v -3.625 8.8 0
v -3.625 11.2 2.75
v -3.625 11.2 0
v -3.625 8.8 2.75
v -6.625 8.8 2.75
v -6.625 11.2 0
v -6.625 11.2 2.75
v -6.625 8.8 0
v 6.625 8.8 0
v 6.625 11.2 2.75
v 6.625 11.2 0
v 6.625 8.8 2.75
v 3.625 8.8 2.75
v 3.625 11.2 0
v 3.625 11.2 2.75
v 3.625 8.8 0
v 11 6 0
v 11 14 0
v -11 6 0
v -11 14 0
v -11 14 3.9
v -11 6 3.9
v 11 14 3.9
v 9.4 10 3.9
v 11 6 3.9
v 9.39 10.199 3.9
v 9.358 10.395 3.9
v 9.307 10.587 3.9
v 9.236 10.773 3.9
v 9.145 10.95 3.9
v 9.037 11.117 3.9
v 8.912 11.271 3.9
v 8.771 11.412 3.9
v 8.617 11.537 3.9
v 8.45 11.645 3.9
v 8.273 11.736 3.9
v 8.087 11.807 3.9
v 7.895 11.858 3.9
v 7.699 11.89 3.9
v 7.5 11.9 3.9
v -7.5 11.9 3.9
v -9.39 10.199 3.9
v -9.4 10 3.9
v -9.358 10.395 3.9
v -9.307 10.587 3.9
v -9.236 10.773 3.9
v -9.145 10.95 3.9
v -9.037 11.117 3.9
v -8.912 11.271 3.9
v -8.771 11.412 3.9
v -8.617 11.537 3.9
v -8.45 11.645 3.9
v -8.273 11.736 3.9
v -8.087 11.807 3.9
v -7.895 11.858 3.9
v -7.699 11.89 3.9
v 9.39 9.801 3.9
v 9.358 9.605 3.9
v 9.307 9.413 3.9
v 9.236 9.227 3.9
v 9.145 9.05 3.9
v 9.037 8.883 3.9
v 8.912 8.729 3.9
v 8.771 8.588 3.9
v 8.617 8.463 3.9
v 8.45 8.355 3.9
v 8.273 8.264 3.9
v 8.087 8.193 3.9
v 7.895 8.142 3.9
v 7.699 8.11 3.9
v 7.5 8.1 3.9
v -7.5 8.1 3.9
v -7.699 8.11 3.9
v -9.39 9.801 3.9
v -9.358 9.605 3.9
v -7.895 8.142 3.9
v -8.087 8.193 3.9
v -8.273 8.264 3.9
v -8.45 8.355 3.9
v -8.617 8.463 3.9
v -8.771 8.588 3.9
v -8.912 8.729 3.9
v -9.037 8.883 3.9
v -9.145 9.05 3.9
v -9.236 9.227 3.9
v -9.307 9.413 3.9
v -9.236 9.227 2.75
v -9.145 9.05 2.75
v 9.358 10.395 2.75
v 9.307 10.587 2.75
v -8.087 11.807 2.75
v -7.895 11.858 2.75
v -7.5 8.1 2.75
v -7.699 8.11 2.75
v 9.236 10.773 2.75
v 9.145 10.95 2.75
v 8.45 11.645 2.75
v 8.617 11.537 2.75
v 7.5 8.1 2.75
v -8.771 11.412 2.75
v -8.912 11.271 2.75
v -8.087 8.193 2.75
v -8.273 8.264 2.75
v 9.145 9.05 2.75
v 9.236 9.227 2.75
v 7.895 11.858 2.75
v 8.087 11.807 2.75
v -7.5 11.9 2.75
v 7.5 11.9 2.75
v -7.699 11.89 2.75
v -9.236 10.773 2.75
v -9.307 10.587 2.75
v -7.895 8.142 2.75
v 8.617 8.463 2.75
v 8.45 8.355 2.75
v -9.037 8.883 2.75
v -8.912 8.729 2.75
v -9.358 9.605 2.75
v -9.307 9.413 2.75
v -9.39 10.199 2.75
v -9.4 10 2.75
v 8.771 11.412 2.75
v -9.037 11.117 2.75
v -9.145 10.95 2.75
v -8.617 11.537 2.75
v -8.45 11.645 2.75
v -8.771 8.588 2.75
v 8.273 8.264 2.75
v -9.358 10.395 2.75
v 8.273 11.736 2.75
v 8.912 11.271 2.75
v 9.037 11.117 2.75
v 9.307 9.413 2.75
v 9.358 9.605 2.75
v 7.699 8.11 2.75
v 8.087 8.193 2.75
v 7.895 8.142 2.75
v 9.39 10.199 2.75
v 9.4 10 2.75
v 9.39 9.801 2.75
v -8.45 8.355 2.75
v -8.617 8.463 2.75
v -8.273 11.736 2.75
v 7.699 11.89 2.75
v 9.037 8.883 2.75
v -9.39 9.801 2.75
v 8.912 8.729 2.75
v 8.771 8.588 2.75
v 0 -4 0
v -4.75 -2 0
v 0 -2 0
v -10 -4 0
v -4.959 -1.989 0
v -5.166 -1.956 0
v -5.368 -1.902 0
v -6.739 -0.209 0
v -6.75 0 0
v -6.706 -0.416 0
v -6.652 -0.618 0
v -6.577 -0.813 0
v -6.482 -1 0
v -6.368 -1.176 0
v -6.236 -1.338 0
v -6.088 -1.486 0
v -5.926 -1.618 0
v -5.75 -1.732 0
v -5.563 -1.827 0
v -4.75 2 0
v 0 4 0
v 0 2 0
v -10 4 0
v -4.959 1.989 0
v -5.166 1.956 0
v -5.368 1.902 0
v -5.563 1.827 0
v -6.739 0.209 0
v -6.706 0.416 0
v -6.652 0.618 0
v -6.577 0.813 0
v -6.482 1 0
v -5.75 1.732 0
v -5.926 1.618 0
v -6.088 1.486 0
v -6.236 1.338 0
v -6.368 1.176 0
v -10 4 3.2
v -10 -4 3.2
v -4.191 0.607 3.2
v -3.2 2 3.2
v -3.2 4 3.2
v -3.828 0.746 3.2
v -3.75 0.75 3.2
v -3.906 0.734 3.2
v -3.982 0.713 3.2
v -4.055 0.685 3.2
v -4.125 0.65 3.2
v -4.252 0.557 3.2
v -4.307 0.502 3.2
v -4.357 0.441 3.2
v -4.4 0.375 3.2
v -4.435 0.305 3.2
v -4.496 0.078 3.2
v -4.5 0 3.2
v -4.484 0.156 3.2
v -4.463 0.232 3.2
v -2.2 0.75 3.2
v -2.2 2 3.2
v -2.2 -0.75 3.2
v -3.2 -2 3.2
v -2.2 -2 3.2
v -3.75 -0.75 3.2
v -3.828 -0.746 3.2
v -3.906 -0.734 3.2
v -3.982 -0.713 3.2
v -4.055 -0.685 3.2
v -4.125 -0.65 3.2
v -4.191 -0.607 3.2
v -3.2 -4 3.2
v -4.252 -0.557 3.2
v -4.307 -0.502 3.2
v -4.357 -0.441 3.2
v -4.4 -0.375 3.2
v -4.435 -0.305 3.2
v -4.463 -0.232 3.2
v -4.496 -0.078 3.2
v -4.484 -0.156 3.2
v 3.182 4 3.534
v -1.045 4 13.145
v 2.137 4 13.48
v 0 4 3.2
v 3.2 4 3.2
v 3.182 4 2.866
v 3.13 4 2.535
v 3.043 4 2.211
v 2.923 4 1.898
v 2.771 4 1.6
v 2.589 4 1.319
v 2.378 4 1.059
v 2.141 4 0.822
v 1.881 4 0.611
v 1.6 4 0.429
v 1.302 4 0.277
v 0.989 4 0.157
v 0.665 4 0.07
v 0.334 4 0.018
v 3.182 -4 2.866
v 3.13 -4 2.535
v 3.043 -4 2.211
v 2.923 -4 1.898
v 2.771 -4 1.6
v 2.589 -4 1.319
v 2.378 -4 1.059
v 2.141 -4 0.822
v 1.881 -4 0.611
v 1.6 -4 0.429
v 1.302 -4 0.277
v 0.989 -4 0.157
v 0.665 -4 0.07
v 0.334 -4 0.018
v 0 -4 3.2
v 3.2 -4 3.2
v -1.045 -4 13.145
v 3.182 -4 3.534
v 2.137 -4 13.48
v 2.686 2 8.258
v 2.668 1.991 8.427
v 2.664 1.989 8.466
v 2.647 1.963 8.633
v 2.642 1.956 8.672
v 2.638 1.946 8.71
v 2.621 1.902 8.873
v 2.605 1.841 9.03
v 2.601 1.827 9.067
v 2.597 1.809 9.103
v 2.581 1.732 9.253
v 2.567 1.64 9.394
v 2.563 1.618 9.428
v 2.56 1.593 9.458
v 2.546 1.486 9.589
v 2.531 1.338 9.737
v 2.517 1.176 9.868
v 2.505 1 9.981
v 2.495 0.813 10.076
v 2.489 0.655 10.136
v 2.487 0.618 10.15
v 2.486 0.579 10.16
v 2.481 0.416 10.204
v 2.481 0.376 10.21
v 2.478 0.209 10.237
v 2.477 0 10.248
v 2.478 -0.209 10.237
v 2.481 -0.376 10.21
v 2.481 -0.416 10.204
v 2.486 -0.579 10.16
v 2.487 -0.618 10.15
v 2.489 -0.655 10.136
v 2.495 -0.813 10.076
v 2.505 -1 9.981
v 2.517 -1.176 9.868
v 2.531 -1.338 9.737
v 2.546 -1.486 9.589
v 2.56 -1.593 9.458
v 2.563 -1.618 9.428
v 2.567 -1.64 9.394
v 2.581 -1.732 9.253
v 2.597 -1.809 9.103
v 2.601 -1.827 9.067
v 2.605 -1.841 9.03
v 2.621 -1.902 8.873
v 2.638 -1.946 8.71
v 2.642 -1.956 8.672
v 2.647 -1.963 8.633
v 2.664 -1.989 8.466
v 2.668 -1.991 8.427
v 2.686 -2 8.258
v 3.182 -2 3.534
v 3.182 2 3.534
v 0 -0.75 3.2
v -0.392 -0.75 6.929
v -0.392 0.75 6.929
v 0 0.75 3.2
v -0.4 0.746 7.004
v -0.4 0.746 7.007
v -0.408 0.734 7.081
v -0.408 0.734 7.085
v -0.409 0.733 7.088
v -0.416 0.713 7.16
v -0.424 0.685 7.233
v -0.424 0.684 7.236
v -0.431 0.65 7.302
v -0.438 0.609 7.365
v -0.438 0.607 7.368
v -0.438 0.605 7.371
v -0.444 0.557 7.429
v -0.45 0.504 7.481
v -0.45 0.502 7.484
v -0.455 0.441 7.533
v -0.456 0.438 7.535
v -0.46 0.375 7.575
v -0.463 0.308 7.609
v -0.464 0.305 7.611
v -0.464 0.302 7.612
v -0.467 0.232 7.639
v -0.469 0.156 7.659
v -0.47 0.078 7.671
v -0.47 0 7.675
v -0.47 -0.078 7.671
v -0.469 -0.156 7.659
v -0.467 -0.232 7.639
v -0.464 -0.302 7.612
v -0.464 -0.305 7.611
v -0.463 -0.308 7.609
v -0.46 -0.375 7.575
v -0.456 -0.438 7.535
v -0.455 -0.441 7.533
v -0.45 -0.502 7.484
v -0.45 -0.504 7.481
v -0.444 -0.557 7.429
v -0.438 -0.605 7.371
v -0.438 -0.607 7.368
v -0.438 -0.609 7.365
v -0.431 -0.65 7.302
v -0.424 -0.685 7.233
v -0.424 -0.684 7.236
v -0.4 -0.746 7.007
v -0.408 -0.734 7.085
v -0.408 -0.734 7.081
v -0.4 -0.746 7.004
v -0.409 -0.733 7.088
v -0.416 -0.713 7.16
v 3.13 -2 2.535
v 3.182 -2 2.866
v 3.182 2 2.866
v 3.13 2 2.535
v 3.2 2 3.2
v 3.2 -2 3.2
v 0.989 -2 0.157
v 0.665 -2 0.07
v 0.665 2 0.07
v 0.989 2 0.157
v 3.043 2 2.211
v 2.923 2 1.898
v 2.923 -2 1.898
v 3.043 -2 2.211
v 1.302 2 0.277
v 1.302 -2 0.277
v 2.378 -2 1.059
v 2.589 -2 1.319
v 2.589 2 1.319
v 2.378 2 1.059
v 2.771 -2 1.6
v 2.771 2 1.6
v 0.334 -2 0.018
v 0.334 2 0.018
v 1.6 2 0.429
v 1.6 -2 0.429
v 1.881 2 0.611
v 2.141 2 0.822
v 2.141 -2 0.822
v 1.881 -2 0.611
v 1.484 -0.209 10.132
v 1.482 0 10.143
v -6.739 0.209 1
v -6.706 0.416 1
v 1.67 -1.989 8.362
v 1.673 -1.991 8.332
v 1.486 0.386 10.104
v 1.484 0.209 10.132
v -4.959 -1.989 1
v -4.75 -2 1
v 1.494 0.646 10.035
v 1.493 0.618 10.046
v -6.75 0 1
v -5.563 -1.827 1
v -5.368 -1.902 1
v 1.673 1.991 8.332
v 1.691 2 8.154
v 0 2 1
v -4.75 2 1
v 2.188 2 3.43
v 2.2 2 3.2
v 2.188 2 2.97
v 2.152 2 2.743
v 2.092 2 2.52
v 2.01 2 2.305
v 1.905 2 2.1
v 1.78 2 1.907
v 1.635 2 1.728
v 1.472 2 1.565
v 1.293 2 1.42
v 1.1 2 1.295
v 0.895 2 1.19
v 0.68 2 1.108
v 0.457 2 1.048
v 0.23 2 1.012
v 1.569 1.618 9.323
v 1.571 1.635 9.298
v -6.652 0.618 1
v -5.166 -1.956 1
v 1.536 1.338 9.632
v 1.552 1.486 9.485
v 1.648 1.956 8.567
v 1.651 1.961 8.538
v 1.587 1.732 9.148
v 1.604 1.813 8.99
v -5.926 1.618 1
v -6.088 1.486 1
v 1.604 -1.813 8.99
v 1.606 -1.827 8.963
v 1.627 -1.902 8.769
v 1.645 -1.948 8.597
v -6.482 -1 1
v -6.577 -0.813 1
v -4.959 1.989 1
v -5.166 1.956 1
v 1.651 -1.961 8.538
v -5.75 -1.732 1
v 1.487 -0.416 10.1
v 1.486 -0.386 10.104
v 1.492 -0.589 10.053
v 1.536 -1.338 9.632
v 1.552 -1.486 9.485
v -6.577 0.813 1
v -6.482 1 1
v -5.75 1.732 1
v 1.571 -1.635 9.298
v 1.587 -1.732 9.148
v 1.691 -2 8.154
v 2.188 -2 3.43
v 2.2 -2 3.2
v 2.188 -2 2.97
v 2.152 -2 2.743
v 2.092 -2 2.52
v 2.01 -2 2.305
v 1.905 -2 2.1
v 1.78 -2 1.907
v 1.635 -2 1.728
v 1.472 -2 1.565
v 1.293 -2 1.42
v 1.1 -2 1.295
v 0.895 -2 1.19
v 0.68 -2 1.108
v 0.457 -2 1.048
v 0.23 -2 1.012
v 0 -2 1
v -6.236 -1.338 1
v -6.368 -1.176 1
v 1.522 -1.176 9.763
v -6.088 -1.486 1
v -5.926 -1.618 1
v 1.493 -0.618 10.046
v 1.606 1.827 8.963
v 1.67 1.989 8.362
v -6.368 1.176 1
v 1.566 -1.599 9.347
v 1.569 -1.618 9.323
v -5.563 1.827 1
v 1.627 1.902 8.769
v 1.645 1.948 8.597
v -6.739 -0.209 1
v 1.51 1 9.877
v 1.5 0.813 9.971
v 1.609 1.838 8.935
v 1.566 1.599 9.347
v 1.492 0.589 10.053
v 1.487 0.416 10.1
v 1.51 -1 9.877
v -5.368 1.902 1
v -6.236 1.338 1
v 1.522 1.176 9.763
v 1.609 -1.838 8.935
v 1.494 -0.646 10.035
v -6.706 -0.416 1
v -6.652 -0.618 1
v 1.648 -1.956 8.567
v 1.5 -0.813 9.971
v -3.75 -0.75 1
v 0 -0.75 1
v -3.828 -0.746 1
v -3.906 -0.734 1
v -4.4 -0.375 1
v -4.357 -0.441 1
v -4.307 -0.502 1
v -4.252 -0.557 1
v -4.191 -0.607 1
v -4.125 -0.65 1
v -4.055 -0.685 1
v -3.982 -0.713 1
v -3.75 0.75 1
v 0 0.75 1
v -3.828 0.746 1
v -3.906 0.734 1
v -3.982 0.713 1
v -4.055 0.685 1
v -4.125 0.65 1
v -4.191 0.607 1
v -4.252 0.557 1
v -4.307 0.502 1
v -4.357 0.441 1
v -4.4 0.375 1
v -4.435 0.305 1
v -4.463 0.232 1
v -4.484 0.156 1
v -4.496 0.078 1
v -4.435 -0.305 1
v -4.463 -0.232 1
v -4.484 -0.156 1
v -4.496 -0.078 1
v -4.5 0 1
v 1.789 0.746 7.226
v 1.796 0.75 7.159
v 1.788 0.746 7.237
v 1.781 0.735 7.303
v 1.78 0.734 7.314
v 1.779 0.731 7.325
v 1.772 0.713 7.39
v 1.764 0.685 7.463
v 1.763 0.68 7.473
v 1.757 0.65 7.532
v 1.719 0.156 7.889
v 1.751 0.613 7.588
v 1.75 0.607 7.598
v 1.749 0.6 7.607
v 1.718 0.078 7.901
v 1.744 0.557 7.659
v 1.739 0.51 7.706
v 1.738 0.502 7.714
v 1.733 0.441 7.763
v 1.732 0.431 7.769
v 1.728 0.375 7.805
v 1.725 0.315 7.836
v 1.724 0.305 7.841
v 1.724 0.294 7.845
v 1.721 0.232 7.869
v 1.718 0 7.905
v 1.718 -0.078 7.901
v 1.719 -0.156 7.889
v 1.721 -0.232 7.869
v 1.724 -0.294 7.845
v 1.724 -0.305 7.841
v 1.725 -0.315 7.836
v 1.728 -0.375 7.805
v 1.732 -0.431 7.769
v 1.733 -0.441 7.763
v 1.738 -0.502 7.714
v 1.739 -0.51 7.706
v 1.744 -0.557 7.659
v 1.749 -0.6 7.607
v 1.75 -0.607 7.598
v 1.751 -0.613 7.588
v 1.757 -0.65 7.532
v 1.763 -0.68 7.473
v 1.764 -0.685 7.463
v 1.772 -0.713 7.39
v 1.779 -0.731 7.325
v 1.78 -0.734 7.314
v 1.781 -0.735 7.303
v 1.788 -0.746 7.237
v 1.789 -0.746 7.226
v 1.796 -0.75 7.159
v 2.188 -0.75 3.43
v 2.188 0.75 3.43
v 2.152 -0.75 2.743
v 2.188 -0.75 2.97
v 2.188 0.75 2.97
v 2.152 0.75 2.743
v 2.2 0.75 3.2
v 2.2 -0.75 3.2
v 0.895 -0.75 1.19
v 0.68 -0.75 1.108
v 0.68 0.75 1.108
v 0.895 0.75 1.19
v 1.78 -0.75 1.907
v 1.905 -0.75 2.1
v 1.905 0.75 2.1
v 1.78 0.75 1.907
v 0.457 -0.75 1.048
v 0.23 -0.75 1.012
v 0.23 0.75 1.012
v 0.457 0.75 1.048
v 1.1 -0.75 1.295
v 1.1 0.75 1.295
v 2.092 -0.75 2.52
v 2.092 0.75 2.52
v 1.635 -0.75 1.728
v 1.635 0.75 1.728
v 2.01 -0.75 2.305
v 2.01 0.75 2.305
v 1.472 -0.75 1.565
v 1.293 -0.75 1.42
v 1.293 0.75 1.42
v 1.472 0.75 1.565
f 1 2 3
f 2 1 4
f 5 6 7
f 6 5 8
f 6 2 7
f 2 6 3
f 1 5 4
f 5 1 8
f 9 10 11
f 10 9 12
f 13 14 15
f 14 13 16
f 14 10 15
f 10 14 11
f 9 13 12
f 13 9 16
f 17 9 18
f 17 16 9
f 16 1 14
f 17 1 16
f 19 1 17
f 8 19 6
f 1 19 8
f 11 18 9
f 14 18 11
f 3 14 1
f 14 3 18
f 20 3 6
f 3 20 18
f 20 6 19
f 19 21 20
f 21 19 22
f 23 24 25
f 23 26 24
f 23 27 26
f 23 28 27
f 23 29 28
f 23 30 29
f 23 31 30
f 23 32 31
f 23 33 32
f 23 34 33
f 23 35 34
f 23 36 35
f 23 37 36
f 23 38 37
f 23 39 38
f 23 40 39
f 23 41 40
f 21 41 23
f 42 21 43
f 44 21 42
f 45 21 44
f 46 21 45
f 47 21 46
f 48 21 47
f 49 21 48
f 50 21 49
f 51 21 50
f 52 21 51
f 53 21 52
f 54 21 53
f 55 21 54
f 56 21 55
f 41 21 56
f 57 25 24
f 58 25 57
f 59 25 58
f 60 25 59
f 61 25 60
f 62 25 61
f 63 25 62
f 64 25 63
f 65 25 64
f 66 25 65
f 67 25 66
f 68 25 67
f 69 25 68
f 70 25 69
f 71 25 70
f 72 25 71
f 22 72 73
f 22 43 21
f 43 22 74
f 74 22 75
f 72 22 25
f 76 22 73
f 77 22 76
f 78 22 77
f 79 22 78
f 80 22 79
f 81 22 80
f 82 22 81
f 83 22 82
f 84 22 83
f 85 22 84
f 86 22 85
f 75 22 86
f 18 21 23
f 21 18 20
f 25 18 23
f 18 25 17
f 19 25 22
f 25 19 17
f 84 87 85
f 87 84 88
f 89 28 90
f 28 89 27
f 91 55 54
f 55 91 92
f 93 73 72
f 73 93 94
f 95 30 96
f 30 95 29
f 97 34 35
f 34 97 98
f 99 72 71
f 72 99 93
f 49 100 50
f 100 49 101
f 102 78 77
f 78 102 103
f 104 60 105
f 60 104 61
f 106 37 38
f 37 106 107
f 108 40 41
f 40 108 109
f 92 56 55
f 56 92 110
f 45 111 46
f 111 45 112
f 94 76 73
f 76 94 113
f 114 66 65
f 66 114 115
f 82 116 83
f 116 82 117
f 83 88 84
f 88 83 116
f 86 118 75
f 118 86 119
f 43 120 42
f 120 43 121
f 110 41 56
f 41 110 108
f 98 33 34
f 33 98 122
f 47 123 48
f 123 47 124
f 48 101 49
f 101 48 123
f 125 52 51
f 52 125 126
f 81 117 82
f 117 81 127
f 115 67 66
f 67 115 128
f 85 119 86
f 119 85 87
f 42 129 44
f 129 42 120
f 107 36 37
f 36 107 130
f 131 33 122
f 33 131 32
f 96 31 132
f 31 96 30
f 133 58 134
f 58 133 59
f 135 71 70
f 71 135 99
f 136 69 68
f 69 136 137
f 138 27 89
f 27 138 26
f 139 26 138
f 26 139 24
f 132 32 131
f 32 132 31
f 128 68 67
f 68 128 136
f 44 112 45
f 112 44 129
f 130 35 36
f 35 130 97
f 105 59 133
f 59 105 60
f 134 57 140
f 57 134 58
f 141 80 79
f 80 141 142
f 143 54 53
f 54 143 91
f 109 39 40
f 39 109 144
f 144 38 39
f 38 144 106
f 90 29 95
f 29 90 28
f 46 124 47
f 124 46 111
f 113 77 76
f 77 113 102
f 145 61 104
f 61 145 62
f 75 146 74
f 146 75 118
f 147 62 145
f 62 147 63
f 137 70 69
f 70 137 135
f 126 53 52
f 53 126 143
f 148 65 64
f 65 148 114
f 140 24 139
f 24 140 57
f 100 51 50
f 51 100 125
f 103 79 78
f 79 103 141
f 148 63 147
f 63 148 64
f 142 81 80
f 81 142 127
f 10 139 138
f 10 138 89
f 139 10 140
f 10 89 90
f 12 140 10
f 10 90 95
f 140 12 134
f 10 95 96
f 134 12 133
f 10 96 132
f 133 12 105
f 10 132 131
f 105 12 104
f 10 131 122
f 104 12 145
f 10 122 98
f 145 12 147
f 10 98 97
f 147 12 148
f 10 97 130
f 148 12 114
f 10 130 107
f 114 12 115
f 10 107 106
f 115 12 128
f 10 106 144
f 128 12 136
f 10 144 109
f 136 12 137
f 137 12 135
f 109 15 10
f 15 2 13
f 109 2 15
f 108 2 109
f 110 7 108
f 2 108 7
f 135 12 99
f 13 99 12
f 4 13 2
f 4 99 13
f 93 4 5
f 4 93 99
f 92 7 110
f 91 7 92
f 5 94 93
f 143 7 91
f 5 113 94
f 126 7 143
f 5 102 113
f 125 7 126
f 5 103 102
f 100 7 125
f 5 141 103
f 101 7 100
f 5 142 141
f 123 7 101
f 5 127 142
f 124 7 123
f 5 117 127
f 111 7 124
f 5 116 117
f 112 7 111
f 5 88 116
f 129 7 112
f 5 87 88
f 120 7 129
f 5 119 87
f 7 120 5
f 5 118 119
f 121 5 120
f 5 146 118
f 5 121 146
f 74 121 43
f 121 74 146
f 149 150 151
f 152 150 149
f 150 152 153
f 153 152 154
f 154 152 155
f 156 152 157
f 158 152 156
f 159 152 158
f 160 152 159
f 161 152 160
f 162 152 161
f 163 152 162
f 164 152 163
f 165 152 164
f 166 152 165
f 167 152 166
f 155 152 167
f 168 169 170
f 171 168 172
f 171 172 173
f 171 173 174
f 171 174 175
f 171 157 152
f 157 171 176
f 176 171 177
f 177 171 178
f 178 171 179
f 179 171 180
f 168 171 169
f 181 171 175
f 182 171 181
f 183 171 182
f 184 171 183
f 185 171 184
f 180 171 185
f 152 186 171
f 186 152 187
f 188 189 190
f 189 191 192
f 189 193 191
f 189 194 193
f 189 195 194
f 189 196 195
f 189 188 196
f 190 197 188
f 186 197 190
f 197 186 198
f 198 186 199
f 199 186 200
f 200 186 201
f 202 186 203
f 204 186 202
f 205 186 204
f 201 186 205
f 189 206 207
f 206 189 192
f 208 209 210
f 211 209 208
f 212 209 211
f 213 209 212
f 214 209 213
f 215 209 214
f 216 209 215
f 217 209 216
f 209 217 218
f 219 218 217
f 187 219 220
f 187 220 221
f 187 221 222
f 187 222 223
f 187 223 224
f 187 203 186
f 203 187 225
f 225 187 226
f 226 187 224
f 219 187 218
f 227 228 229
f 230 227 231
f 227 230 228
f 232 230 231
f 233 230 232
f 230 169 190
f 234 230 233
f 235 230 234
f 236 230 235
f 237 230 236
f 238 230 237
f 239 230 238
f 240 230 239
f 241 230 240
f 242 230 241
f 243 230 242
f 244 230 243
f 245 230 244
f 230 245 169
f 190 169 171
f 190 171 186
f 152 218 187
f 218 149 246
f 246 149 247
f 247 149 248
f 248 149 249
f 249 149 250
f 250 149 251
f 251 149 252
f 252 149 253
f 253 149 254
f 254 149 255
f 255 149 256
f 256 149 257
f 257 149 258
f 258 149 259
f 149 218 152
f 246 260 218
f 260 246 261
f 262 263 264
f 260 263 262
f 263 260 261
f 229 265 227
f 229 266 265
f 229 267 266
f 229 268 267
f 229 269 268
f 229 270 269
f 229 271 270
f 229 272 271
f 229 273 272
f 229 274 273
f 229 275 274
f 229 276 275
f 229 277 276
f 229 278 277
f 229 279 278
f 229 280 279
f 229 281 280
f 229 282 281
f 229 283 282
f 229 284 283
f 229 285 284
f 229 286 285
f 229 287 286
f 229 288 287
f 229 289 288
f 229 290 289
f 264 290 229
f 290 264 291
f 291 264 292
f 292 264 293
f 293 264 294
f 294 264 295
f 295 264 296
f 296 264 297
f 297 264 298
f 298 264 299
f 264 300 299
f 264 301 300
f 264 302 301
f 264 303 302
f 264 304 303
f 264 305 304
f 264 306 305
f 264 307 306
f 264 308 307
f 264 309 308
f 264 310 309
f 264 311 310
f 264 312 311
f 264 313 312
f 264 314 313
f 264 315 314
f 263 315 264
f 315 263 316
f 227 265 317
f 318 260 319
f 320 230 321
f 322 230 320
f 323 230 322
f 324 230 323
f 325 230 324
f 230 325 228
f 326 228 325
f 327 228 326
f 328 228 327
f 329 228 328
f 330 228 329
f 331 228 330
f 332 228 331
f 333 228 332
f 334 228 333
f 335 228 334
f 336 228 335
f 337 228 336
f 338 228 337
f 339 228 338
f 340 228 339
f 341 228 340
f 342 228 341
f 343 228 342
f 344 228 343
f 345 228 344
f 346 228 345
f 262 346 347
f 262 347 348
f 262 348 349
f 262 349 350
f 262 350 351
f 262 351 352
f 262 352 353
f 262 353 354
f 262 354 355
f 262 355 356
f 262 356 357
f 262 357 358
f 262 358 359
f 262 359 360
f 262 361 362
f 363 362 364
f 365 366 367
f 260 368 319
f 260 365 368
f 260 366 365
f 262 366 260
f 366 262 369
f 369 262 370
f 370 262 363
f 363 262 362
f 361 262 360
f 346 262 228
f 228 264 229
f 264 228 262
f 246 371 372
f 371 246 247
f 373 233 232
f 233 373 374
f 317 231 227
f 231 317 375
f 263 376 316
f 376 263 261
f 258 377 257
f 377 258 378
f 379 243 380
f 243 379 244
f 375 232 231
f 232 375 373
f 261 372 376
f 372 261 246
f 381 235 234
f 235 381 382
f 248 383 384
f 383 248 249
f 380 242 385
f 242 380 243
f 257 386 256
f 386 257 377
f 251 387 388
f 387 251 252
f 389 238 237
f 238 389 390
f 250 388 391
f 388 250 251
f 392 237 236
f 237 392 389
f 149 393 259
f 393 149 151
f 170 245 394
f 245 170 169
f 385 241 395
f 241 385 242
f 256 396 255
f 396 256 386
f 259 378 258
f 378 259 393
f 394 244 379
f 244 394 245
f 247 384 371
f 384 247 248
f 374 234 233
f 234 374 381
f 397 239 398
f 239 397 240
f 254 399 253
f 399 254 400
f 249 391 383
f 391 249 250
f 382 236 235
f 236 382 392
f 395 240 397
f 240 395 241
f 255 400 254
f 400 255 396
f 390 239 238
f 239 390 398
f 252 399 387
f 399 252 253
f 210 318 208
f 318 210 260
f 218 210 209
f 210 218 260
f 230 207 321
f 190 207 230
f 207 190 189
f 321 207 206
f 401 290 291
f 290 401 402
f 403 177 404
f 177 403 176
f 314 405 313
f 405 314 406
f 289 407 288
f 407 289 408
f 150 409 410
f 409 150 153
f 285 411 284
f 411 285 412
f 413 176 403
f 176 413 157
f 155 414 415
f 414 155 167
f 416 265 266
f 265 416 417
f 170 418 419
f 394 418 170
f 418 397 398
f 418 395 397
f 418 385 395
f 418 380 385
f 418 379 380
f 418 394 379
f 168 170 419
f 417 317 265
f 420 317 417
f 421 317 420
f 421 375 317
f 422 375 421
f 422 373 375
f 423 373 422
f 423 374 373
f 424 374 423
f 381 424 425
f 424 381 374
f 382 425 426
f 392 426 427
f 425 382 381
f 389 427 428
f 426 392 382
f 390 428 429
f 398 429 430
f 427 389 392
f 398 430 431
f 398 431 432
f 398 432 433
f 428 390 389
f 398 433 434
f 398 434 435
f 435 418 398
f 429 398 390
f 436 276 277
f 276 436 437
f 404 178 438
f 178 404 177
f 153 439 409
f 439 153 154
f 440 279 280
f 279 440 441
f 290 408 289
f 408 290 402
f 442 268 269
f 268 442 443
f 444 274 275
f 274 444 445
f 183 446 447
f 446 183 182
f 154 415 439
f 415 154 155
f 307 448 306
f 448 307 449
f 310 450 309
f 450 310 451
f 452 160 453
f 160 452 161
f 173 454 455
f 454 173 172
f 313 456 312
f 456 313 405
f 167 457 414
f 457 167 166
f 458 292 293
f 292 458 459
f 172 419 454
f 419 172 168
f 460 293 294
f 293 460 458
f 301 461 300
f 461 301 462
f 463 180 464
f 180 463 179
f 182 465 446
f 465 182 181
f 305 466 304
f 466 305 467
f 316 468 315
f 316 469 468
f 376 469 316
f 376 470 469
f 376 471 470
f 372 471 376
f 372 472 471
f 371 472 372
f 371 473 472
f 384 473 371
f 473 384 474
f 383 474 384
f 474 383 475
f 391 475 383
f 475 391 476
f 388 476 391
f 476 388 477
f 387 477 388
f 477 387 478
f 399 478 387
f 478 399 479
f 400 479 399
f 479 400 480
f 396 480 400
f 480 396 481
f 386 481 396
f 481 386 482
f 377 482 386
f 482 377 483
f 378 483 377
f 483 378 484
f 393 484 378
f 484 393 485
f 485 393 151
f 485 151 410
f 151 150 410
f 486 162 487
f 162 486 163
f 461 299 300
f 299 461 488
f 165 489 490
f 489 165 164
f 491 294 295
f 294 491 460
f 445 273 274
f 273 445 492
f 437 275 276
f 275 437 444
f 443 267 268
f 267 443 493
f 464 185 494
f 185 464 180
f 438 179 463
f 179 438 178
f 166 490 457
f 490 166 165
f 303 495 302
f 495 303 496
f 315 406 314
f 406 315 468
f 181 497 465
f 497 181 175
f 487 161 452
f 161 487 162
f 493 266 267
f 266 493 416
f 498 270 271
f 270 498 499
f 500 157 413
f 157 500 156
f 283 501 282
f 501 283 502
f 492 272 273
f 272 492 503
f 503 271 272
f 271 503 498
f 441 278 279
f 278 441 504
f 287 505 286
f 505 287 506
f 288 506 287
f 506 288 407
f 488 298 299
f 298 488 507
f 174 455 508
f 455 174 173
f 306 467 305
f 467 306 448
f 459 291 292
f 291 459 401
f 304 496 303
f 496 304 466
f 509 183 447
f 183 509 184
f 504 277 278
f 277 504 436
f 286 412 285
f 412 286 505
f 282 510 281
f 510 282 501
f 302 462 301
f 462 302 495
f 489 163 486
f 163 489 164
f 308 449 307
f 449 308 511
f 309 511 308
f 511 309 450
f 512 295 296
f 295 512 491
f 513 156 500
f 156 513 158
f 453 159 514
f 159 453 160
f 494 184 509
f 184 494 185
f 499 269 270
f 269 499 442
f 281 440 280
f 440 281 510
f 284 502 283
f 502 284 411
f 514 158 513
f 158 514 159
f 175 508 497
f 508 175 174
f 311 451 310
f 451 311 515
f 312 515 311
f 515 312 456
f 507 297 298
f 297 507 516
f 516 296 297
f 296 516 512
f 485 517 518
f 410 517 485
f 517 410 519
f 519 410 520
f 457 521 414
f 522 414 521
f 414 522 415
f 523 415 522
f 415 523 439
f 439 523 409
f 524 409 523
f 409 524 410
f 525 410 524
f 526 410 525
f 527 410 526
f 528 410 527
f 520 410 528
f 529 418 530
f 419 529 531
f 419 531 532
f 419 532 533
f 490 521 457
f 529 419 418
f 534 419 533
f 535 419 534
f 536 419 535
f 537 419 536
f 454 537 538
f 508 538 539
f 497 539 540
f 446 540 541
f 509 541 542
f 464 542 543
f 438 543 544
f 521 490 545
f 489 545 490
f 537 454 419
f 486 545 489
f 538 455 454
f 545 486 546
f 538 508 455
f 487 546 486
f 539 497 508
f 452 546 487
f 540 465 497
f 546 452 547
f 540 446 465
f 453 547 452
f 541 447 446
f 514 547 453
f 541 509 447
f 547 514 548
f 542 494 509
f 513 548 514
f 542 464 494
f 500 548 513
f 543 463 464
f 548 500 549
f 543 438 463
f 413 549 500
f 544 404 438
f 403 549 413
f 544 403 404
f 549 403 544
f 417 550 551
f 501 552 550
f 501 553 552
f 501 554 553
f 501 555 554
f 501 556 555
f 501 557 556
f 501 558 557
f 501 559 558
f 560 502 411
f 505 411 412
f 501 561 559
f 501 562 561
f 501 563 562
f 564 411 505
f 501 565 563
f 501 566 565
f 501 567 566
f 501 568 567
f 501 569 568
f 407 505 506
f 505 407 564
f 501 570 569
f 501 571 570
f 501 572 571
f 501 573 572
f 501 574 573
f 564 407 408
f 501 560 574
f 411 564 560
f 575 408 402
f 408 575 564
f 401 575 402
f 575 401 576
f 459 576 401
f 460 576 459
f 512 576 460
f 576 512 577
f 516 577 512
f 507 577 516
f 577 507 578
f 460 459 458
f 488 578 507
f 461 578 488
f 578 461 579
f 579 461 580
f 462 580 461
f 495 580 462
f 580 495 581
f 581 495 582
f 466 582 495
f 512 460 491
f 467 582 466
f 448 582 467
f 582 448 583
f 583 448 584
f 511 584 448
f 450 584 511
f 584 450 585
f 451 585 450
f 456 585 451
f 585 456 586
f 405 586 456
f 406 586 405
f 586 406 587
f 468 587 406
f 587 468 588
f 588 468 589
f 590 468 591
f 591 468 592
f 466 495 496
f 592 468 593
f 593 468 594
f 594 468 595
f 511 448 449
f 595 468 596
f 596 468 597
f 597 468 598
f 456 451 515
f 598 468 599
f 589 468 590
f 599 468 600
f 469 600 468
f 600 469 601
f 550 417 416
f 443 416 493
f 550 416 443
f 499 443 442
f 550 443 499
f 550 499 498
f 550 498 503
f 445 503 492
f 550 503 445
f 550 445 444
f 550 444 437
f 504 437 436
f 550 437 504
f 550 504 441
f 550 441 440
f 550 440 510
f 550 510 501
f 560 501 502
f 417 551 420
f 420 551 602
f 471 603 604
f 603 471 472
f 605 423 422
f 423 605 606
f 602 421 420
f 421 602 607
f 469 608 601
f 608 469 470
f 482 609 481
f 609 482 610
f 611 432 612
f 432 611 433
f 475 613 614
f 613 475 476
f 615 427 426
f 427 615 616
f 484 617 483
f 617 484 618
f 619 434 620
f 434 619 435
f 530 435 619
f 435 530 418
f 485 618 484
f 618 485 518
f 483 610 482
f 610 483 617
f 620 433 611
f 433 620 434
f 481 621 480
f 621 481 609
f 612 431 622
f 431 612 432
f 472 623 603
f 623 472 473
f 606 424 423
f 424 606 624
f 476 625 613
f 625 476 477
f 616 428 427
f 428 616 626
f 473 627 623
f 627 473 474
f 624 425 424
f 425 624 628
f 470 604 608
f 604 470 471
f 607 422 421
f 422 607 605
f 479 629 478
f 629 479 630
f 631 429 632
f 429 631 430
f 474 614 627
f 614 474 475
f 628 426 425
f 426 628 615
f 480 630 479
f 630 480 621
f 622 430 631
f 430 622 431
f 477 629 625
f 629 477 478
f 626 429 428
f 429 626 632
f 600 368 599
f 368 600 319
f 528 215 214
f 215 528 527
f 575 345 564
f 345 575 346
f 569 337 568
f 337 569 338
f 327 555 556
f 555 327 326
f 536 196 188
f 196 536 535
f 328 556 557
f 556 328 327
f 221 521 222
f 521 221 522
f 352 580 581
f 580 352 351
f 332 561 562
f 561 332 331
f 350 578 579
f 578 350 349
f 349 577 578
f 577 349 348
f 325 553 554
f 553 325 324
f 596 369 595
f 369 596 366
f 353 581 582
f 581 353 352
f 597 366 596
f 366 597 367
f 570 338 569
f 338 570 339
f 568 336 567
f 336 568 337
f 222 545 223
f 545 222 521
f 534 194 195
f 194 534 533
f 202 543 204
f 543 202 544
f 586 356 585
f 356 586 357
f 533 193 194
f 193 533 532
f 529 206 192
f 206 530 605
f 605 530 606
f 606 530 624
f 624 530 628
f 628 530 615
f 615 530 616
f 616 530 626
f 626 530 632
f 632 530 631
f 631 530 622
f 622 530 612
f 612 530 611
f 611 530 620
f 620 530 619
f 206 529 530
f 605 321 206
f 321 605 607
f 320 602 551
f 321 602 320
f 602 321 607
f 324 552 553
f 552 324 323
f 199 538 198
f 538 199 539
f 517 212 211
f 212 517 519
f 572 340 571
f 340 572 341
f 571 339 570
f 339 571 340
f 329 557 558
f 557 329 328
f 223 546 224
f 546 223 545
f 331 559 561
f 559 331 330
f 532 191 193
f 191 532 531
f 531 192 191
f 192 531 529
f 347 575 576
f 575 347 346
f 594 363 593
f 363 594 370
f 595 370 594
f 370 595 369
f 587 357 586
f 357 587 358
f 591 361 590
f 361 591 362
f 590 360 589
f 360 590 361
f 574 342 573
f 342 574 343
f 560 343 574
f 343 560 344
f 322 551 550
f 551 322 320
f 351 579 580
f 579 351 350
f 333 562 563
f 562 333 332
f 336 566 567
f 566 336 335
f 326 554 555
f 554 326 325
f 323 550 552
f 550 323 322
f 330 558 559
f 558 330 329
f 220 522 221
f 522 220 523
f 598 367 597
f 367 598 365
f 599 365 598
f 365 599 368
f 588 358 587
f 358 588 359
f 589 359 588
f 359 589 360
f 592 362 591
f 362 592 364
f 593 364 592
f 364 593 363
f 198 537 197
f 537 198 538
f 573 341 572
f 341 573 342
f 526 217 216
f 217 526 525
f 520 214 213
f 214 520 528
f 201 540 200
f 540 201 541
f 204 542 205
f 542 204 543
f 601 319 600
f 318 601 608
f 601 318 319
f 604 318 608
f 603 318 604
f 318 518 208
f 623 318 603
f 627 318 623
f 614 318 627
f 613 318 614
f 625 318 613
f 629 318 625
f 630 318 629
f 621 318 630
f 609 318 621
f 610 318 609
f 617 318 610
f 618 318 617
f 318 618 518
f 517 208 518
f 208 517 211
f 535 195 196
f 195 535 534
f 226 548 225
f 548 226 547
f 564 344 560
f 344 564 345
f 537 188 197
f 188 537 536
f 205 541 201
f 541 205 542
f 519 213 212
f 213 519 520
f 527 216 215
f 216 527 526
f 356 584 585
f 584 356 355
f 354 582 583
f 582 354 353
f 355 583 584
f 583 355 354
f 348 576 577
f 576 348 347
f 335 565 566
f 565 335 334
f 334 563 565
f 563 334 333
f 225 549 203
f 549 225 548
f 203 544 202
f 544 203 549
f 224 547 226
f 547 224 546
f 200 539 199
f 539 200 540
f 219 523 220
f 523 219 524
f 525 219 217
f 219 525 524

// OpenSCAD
// Test jig for Rubber feet for the Macintosh Portable
// Copyright François Revol, 2026

$fn=60;

translate([0,10,0]) difference() {
    h = 4.2-0.3;
    linear_extrude(h) square([22,8],center=true);
    translate([0,0,h-1.15]) hull() for(dx=[-1,1]) translate([dx*15/2,0,0]) cylinder(d=3.8,h=2);
    for(dx=[-1,1]) translate([dx*10.25/2,0,0]) cube([3,2.4,10], center=true);
}


module face(z,h,d,ox=0) {
    angle = 84;
    angles = [0,-180+angle];
    o = [-1,1];
    difference() {
        union() {
            for (i=[0,1]) {
                translate([0,0,z]) rotate([0,angles[i],0]) translate([o[i]*10/2,0,-h]) linear_extrude(h) square([10,8],center=true);
            }
            translate([0,0,z]) difference() {
                rotate([90,0,0]) cylinder(r=h,h=8, center=true);
                translate([-10/2,0,10/2]) cube(10, center=true);
            }
        }
        hull() {
            for (i=[0,1]) {
                translate([0,0,z]) rotate([0,angles[i],0]) translate([o[i]*(9.5/2-ox),0,-10]) cylinder(d=d,h=22, center=true);
            }
        }
    }
}

{
    h = 3.2;

    face(h, h, d=4);
    face(h, h-1, d=1.5, ox=1); // opening is square but well
    if ($preview) color("orange", 0.2) translate([-1.6,0,0]) cube([9.75,10,20],center=true);
    if ($preview) color("blue", 0.2) translate([-0.2,0,0]) cube([7,10,20],center=true);
}
